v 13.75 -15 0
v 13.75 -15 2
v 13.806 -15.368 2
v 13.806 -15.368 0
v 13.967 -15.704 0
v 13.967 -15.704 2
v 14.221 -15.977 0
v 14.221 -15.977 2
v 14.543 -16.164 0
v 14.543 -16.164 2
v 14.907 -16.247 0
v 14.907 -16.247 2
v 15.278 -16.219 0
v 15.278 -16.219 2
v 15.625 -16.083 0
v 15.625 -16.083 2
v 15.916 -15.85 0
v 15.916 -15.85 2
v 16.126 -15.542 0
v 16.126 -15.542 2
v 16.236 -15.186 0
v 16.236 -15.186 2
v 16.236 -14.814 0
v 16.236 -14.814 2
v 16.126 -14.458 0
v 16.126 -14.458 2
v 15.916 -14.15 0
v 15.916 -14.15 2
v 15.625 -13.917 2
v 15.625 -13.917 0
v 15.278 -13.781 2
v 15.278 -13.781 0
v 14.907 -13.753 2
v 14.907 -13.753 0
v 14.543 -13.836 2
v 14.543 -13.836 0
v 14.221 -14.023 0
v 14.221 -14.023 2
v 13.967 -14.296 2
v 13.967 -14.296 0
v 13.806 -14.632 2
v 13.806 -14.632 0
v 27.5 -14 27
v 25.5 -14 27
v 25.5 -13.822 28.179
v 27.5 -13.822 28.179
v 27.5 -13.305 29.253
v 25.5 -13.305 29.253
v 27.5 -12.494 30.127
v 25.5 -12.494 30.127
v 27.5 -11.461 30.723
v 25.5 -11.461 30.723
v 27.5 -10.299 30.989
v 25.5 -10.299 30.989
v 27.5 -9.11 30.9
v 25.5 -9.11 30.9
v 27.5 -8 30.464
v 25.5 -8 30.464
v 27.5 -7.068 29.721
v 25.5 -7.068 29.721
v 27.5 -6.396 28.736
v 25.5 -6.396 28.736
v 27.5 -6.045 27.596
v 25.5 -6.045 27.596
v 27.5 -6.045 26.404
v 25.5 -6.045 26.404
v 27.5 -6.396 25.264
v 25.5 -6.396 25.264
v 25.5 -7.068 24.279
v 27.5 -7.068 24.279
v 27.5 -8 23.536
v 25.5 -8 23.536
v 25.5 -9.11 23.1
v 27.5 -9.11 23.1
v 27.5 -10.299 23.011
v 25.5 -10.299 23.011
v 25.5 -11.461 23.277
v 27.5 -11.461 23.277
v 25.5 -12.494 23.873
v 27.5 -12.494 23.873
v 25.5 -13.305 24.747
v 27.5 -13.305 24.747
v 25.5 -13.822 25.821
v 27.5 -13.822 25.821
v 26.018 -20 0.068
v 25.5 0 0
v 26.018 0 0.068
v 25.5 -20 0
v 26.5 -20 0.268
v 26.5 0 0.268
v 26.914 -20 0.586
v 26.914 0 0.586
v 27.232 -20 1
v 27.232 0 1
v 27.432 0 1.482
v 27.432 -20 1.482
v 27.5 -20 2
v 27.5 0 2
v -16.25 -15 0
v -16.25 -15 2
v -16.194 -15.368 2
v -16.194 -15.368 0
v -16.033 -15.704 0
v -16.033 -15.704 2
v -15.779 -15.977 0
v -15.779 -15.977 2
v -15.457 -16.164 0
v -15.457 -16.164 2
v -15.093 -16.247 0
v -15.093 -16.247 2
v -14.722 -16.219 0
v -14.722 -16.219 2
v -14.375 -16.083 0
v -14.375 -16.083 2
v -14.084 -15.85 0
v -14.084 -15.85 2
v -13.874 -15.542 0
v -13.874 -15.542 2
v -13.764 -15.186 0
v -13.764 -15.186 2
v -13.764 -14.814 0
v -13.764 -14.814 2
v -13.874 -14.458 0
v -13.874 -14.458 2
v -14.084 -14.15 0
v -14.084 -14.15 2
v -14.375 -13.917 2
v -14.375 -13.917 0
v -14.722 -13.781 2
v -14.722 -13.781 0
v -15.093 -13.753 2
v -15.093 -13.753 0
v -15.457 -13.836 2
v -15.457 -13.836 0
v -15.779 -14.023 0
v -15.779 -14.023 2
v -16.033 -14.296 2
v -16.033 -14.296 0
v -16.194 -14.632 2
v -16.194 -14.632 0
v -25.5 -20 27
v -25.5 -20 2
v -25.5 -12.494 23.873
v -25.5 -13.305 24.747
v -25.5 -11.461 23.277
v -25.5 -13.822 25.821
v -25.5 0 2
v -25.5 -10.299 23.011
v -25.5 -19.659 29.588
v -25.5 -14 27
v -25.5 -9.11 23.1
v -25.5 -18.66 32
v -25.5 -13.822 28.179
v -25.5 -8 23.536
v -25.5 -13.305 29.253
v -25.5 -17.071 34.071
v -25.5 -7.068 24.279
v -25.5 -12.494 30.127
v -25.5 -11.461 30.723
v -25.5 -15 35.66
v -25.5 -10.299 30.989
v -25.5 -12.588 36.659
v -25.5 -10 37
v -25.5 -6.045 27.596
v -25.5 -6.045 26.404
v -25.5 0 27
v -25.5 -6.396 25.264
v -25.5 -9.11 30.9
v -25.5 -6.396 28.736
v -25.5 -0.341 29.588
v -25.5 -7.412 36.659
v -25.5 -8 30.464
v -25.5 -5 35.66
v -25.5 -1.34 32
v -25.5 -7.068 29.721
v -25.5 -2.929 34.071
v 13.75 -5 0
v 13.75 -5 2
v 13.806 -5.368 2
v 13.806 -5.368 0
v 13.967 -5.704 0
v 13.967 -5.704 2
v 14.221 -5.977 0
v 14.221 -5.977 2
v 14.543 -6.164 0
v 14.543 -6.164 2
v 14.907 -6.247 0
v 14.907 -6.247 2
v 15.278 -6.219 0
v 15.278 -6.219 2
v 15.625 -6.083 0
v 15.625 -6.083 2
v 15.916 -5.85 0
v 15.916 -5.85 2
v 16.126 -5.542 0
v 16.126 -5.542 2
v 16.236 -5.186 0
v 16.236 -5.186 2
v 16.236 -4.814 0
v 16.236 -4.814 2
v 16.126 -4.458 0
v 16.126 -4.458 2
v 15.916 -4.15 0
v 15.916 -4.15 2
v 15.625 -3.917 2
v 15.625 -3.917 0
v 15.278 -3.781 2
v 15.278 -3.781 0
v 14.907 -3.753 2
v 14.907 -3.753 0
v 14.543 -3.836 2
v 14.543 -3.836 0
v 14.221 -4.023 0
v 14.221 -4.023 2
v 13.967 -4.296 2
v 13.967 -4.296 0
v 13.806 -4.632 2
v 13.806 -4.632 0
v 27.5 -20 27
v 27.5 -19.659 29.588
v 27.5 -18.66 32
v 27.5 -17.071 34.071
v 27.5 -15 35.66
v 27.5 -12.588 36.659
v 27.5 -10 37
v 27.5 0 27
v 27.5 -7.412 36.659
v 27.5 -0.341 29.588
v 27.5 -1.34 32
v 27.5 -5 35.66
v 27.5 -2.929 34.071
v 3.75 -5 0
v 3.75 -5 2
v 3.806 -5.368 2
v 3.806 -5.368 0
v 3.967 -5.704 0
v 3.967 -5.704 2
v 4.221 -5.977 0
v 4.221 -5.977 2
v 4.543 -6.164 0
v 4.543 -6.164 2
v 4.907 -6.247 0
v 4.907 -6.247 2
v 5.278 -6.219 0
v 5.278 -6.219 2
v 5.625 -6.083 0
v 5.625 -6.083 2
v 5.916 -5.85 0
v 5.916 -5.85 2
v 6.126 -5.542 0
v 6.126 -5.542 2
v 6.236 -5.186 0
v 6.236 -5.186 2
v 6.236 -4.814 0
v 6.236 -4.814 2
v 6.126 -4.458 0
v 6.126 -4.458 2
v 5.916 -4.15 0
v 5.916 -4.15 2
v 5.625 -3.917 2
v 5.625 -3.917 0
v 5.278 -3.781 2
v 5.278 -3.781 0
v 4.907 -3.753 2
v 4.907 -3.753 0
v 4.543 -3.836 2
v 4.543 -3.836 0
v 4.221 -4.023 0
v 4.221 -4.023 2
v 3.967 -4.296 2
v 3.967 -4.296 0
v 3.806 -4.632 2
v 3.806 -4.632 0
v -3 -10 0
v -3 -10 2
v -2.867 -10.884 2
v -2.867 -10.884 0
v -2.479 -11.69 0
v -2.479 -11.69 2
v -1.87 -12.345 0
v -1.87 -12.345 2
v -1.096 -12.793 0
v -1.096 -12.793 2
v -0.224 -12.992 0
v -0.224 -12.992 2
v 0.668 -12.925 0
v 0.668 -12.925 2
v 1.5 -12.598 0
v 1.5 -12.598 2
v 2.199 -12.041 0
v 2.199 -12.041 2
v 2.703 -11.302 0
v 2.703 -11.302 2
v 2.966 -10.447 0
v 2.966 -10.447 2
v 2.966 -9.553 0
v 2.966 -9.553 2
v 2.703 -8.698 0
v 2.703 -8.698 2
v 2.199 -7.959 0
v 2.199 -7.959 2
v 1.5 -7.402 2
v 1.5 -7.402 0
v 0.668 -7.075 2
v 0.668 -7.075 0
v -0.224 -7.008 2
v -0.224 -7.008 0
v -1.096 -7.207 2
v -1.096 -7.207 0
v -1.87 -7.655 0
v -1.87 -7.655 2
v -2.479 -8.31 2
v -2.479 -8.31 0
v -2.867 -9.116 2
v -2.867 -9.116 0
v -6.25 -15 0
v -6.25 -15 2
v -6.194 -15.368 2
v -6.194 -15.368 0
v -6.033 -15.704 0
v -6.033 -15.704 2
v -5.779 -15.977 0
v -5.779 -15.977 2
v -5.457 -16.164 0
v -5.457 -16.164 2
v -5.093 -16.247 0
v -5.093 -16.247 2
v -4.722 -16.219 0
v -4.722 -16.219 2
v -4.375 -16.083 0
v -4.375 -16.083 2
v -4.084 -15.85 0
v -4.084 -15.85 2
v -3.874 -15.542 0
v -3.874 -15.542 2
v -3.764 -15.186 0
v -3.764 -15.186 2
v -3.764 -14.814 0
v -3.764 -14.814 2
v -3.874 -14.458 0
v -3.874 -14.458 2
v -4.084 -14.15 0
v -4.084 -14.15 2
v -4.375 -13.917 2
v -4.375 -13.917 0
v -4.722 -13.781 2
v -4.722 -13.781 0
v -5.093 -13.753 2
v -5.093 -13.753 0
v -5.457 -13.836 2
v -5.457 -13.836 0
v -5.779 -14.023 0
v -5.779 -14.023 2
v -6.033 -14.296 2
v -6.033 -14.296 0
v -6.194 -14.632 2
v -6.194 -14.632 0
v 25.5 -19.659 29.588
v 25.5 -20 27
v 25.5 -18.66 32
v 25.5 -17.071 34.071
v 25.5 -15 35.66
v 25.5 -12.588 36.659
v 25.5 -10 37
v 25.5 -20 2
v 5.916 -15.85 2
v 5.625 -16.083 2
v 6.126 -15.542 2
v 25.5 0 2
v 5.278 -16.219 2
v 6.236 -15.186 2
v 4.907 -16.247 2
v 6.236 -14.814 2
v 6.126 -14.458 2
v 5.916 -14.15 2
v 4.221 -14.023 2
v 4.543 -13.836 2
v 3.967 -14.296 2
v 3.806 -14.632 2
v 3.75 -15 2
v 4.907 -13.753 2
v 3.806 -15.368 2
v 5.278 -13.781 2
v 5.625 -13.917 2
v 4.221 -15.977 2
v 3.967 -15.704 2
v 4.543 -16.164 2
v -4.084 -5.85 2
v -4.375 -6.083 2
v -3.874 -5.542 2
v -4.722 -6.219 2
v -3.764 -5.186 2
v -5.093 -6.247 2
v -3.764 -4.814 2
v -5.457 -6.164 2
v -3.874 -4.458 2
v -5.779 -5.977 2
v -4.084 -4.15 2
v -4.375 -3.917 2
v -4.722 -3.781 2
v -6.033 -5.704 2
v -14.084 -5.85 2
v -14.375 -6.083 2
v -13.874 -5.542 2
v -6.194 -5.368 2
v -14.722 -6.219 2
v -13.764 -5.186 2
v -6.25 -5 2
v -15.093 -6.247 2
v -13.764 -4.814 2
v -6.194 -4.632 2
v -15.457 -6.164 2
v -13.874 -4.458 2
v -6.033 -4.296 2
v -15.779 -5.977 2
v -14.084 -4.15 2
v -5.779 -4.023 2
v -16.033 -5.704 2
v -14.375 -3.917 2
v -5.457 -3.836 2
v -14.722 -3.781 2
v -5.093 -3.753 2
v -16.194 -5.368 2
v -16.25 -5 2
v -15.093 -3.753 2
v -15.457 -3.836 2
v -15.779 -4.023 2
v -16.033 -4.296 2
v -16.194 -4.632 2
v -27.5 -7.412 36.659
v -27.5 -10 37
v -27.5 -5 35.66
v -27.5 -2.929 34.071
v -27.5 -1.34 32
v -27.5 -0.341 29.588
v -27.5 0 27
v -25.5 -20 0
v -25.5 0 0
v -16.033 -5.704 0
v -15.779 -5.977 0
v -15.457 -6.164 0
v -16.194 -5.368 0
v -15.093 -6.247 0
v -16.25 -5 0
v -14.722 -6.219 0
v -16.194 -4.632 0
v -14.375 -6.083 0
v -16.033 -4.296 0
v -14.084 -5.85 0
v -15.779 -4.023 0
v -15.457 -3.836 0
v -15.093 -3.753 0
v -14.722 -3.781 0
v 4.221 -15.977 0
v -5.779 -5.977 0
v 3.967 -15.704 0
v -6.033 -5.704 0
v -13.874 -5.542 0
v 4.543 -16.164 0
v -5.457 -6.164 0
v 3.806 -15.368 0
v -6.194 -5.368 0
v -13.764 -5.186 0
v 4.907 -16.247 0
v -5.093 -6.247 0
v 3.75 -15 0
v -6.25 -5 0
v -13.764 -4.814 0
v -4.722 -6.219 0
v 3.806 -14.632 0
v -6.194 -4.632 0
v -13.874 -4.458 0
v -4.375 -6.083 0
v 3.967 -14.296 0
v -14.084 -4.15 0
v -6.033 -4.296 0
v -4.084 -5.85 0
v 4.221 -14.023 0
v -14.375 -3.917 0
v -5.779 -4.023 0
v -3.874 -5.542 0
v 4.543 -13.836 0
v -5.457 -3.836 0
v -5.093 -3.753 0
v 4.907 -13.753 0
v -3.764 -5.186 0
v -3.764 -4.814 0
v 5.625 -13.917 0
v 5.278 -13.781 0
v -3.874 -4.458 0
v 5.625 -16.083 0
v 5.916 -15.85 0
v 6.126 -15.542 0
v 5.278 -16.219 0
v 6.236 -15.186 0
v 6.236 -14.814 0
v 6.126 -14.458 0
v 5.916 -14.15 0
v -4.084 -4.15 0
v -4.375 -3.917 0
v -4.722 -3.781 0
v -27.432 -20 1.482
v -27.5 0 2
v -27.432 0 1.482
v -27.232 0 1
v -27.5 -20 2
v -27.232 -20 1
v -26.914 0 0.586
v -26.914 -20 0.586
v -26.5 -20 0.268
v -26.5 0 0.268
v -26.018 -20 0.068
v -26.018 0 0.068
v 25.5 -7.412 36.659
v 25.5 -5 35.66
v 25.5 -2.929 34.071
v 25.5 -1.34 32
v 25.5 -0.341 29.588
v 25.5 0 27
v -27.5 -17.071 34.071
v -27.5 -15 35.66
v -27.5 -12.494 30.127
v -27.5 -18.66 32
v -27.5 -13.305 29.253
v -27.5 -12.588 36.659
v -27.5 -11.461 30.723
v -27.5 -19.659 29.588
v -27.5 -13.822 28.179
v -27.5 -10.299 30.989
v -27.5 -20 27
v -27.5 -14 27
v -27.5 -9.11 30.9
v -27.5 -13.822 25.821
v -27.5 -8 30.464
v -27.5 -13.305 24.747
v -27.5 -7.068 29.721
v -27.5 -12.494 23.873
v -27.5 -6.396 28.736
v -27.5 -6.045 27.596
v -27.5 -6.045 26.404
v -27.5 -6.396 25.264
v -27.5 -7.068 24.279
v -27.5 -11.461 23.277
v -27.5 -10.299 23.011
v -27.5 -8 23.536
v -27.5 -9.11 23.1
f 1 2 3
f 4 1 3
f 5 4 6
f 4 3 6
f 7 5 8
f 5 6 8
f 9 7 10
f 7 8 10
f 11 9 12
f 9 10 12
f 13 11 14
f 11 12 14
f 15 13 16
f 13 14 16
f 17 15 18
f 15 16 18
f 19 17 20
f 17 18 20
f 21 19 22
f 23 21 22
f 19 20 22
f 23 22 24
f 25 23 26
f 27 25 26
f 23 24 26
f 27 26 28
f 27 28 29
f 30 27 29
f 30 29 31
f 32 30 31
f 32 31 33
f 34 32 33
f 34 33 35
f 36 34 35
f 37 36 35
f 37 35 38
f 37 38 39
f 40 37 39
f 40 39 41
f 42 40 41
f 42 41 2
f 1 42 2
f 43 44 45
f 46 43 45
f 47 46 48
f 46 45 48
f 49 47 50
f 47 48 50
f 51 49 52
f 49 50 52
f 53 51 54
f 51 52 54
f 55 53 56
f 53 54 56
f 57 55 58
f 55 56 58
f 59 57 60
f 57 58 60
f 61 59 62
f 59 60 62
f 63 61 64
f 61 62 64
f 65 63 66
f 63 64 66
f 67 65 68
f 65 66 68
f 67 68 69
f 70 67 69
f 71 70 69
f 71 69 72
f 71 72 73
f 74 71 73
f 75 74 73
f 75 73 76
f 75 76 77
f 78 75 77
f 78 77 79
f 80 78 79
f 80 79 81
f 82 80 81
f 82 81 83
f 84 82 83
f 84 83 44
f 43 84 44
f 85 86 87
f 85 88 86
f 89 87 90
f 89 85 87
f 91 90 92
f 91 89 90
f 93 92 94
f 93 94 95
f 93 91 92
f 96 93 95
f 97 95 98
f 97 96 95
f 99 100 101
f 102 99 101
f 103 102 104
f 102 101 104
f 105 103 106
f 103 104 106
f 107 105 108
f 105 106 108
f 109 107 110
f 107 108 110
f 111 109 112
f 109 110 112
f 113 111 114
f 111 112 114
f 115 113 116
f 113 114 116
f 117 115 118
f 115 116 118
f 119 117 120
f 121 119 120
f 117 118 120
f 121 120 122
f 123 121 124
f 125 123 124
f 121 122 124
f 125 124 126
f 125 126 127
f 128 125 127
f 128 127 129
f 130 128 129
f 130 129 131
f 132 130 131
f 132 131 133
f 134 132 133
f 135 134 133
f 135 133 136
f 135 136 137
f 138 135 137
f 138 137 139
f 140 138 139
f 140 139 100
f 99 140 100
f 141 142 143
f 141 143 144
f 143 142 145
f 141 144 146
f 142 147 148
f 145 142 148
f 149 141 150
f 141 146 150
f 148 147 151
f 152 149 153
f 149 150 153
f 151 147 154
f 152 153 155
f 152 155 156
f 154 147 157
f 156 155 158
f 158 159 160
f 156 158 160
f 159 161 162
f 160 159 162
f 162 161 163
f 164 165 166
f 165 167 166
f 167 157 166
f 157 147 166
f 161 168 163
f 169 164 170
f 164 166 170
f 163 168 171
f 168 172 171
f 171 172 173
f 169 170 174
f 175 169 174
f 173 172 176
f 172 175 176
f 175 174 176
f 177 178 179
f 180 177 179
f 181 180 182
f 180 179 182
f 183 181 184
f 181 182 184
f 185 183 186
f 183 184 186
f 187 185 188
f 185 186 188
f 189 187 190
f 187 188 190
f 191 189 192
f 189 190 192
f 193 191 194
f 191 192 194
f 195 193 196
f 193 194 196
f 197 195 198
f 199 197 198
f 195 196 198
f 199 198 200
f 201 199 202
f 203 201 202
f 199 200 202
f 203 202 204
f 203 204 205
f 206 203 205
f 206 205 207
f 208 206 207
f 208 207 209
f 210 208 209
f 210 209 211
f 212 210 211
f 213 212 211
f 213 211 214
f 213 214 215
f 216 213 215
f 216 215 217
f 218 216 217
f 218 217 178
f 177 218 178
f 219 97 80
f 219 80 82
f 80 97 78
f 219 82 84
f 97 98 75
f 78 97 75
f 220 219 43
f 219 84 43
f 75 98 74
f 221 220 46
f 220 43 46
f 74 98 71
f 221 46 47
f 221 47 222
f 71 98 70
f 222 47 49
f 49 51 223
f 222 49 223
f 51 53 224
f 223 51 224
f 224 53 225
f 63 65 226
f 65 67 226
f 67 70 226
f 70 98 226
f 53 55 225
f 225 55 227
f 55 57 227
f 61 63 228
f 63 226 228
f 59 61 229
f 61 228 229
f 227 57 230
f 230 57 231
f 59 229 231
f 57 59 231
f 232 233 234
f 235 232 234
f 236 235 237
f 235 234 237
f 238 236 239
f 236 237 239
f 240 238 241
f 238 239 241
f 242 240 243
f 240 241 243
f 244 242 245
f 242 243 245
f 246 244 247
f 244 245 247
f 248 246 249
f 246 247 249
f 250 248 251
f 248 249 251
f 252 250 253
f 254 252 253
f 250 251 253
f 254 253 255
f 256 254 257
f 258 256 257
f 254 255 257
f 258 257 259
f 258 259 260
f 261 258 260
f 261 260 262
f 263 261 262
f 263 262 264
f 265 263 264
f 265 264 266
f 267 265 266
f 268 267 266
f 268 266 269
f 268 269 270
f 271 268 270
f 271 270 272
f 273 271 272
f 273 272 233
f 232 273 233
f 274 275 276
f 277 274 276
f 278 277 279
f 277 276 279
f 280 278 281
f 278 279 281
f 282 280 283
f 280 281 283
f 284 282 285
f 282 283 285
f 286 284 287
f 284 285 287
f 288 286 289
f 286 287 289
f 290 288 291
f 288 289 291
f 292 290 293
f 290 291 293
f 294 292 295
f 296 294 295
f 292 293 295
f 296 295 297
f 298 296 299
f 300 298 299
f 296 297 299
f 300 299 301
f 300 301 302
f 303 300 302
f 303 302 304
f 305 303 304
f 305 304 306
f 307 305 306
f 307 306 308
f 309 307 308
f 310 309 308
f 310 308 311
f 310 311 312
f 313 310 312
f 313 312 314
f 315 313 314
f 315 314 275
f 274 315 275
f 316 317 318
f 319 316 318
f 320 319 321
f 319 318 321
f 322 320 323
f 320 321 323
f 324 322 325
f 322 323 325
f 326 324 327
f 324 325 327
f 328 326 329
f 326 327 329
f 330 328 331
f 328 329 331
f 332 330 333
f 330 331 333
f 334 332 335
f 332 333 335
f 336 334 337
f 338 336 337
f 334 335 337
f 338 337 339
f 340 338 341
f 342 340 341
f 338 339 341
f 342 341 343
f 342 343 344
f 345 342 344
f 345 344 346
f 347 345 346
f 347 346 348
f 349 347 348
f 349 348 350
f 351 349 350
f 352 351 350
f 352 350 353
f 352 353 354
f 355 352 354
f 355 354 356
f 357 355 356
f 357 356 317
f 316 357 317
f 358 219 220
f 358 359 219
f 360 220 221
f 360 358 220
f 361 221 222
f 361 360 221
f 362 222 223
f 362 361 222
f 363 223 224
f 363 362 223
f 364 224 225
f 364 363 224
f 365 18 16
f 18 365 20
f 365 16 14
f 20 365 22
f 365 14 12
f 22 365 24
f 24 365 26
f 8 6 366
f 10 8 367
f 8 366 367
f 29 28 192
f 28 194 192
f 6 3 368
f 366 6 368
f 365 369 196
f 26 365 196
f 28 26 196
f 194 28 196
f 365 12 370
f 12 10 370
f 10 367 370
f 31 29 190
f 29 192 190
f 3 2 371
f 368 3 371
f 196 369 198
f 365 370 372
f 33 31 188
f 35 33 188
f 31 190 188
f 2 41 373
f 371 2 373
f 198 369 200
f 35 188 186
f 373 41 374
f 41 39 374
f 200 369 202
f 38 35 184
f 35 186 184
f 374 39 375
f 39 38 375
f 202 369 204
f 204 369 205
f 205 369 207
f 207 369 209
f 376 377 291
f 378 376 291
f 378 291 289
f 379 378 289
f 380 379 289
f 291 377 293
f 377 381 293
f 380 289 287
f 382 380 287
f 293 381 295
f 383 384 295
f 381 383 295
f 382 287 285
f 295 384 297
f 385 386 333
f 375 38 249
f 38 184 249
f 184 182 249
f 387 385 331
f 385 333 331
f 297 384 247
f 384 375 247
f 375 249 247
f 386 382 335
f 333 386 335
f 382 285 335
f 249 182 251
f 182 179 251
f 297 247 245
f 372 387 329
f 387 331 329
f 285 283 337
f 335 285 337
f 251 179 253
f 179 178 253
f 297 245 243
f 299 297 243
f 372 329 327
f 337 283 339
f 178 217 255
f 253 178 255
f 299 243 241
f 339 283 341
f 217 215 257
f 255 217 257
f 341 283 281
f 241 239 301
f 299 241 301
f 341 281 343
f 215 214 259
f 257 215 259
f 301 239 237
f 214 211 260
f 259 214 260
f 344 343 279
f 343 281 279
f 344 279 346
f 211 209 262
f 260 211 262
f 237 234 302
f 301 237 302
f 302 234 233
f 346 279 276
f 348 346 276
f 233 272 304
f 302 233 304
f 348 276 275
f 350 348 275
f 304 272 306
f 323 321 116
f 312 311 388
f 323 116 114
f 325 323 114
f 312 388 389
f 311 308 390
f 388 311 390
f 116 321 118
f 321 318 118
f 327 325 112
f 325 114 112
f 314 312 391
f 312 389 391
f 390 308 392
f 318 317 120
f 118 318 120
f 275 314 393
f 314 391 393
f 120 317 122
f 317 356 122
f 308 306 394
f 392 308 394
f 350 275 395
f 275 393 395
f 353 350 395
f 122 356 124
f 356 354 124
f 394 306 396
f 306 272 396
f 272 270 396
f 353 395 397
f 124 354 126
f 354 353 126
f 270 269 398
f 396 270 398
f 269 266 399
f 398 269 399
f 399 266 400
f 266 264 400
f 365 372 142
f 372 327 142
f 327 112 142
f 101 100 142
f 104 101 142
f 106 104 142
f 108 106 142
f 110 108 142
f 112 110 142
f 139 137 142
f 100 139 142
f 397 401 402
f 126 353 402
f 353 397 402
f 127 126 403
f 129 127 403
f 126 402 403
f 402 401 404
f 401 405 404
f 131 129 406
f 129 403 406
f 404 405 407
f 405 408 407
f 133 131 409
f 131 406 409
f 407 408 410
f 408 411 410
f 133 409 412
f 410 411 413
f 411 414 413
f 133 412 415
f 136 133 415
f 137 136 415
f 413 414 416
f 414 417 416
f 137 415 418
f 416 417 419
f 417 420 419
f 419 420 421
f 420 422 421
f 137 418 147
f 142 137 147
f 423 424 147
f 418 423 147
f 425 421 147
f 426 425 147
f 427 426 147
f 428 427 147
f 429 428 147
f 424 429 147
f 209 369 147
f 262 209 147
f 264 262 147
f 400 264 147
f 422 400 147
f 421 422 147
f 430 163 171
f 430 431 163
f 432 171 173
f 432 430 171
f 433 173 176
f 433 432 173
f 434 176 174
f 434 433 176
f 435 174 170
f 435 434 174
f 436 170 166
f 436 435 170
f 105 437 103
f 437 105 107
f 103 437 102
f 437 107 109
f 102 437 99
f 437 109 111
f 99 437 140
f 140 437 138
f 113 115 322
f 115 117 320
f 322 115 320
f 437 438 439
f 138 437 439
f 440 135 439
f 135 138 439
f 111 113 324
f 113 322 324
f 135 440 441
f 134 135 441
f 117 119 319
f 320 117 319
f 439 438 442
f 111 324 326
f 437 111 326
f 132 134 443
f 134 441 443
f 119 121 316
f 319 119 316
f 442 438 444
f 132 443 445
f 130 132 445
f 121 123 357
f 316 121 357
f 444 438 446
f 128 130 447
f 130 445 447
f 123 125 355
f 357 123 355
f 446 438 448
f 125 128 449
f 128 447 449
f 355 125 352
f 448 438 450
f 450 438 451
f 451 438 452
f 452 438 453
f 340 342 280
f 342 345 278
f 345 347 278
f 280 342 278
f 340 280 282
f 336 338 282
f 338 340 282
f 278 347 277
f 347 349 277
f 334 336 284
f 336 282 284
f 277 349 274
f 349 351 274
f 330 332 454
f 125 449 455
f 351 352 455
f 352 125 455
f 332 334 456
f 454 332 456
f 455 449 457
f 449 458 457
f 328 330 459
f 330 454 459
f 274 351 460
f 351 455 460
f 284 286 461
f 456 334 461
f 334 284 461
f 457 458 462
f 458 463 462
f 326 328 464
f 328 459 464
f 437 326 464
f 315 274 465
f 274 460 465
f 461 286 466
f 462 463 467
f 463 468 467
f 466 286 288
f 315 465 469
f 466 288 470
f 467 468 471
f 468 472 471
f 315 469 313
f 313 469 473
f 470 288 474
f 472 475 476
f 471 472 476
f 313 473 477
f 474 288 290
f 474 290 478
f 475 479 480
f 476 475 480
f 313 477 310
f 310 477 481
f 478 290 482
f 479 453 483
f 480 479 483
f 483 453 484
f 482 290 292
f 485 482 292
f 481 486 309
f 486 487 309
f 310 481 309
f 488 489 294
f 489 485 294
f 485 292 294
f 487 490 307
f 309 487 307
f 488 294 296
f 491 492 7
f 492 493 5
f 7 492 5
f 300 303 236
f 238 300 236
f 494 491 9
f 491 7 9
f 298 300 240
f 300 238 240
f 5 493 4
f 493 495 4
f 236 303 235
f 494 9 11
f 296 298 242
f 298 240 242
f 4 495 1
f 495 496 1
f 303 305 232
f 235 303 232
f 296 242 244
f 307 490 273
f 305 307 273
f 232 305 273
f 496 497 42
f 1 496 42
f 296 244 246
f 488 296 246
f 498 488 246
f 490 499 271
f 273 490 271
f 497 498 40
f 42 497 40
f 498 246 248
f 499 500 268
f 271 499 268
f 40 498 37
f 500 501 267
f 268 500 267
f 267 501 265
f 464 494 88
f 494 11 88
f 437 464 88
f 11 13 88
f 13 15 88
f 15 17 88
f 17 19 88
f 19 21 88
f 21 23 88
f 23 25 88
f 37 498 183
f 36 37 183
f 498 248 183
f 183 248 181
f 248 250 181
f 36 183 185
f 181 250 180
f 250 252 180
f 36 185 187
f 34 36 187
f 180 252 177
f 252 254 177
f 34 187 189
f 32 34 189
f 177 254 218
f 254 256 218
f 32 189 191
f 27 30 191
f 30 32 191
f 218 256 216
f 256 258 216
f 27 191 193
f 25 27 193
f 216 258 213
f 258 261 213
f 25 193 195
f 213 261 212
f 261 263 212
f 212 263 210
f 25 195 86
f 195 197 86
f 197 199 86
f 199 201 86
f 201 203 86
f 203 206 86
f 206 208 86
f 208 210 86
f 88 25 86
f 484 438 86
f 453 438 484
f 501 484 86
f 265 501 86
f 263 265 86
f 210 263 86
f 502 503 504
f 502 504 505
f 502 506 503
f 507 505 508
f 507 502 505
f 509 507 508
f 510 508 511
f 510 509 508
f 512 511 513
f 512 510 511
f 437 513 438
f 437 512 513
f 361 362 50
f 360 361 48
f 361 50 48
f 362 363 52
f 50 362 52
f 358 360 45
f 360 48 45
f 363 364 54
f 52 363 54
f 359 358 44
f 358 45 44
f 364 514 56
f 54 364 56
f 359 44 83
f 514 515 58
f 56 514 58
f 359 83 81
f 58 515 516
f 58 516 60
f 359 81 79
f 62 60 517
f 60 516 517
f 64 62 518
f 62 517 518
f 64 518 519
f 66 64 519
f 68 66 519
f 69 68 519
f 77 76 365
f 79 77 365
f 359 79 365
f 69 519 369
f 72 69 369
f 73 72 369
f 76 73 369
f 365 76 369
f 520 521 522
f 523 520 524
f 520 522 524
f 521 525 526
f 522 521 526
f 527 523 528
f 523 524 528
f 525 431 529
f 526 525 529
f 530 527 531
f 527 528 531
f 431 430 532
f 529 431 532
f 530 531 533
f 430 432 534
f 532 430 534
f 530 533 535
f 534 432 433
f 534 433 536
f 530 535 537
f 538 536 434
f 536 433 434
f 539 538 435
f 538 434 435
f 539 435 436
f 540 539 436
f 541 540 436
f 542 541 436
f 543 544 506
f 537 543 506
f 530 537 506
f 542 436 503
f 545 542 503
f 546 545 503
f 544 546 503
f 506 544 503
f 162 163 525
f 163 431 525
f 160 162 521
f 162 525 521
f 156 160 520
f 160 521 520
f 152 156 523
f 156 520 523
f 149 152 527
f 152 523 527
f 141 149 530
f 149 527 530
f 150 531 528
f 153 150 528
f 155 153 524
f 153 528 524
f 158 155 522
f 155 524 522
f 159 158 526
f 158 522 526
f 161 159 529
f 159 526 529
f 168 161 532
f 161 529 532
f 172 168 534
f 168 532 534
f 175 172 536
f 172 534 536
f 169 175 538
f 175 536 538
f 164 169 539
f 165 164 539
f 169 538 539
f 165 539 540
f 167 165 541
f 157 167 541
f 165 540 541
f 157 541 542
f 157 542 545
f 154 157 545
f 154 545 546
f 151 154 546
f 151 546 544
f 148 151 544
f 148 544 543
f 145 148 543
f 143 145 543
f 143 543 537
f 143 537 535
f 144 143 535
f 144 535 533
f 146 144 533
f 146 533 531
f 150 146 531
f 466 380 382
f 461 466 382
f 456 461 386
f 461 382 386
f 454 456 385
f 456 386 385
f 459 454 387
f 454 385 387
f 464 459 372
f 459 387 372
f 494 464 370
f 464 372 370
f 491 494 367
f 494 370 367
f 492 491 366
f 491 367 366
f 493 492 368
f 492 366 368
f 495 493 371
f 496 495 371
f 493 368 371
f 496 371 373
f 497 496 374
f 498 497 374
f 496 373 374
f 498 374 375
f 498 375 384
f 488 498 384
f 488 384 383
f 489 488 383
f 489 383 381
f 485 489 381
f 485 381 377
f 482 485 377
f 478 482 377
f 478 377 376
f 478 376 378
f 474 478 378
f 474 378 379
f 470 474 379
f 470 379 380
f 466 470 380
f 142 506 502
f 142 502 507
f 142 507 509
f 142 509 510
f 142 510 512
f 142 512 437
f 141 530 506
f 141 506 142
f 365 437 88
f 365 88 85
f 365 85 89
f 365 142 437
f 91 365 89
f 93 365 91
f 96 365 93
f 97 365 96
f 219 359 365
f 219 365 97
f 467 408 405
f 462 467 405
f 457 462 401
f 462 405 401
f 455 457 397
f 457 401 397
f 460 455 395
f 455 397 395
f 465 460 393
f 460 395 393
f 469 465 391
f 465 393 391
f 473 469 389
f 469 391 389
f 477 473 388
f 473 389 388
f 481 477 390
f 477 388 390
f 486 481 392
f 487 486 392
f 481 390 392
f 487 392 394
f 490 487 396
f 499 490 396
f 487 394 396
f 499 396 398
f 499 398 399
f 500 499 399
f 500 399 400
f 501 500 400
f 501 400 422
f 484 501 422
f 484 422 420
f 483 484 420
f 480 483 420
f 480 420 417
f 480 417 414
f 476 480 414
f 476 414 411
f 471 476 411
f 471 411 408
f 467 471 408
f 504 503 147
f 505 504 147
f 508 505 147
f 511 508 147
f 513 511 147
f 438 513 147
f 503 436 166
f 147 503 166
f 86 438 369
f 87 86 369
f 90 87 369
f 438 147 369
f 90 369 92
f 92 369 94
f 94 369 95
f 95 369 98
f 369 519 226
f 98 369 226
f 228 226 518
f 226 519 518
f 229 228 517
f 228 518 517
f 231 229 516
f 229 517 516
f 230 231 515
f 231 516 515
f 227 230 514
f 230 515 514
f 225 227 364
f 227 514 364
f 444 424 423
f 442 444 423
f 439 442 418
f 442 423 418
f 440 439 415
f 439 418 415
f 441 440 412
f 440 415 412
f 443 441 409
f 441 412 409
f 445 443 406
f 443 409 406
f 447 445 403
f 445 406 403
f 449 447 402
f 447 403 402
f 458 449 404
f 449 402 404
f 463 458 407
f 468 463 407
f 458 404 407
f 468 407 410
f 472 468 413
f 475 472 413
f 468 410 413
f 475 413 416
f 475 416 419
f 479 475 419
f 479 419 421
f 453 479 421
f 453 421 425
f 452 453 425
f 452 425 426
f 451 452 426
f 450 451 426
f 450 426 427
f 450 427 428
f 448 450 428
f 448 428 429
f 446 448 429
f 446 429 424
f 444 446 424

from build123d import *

# Parameters (mm, degrees)
F1_DEPTH = 20
F2_R     = 4
F3_DEPTH = 65.2
F4_R     = 9.99999
F5_R     = 2
F7_D     = 2.5
F8_D     = 6


# Not quite as in the source:
# - a fillet or chamfer is up to 0.001 mm smaller than in the source, because OpenCascade refuses the exact size


with BuildPart() as f1:
    # F0 (on Front) → F1 (new body)
    with BuildSketch(Plane.XZ):
        Polygon((-25.5, 37), (-27.5, 37), (-27.5, 0), (27.5, 0), (27.5, 37), (25.5, 37), (25.5, 2), (-25.5, 2), align=None)
    extrude(amount=F1_DEPTH)

    # F2 (on face) → F3 (cut)
    with BuildSketch(Plane(origin=(-27.5, 0, 0), x_dir=(0, -1, 0), z_dir=(-1, 0, 0))):
        with Locations((10, 27)):
            Circle(F2_R)
    extrude(amount=-F3_DEPTH, mode=Mode.SUBTRACT)

    # F4 (radius 10 in the source; OpenCascade refuses exactly that, so slightly less here)
    f4_edges = [f1.edges().sort_by_distance(p)[0] for p in [
        (-26.5, 0, 37),
        (-26.5, -20, 37),
        (26.5, 0, 37),
        (26.5, -20, 37),
    ]]
    fillet(f4_edges, radius=F4_R)

    # F5
    f5_edges = [f1.edges().sort_by_distance(p)[0] for p in [
        (-27.5, -10, 0),
        (27.5, -10, 0),
    ]]
    fillet(f5_edges, radius=F5_R)

    # F7 (through all)
    with Locations(Plane(origin=(0, 0, 0), x_dir=(1, 0, 0), z_dir=(0, 0, -1))):
        with Locations((-15, 15), (-5, 15), (5, 15), (15, 15), (-15, 5), (-5, 5), (5, 5), (15, 5)):
            Hole(F7_D / 2)

    # F8 (through all)
    with Locations(Plane(origin=(0, 0, 0), x_dir=(1, 0, 0), z_dir=(0, 0, -1))):
        with Locations((0, 10)):
            Hole(F8_D / 2)


solid = f1.part
